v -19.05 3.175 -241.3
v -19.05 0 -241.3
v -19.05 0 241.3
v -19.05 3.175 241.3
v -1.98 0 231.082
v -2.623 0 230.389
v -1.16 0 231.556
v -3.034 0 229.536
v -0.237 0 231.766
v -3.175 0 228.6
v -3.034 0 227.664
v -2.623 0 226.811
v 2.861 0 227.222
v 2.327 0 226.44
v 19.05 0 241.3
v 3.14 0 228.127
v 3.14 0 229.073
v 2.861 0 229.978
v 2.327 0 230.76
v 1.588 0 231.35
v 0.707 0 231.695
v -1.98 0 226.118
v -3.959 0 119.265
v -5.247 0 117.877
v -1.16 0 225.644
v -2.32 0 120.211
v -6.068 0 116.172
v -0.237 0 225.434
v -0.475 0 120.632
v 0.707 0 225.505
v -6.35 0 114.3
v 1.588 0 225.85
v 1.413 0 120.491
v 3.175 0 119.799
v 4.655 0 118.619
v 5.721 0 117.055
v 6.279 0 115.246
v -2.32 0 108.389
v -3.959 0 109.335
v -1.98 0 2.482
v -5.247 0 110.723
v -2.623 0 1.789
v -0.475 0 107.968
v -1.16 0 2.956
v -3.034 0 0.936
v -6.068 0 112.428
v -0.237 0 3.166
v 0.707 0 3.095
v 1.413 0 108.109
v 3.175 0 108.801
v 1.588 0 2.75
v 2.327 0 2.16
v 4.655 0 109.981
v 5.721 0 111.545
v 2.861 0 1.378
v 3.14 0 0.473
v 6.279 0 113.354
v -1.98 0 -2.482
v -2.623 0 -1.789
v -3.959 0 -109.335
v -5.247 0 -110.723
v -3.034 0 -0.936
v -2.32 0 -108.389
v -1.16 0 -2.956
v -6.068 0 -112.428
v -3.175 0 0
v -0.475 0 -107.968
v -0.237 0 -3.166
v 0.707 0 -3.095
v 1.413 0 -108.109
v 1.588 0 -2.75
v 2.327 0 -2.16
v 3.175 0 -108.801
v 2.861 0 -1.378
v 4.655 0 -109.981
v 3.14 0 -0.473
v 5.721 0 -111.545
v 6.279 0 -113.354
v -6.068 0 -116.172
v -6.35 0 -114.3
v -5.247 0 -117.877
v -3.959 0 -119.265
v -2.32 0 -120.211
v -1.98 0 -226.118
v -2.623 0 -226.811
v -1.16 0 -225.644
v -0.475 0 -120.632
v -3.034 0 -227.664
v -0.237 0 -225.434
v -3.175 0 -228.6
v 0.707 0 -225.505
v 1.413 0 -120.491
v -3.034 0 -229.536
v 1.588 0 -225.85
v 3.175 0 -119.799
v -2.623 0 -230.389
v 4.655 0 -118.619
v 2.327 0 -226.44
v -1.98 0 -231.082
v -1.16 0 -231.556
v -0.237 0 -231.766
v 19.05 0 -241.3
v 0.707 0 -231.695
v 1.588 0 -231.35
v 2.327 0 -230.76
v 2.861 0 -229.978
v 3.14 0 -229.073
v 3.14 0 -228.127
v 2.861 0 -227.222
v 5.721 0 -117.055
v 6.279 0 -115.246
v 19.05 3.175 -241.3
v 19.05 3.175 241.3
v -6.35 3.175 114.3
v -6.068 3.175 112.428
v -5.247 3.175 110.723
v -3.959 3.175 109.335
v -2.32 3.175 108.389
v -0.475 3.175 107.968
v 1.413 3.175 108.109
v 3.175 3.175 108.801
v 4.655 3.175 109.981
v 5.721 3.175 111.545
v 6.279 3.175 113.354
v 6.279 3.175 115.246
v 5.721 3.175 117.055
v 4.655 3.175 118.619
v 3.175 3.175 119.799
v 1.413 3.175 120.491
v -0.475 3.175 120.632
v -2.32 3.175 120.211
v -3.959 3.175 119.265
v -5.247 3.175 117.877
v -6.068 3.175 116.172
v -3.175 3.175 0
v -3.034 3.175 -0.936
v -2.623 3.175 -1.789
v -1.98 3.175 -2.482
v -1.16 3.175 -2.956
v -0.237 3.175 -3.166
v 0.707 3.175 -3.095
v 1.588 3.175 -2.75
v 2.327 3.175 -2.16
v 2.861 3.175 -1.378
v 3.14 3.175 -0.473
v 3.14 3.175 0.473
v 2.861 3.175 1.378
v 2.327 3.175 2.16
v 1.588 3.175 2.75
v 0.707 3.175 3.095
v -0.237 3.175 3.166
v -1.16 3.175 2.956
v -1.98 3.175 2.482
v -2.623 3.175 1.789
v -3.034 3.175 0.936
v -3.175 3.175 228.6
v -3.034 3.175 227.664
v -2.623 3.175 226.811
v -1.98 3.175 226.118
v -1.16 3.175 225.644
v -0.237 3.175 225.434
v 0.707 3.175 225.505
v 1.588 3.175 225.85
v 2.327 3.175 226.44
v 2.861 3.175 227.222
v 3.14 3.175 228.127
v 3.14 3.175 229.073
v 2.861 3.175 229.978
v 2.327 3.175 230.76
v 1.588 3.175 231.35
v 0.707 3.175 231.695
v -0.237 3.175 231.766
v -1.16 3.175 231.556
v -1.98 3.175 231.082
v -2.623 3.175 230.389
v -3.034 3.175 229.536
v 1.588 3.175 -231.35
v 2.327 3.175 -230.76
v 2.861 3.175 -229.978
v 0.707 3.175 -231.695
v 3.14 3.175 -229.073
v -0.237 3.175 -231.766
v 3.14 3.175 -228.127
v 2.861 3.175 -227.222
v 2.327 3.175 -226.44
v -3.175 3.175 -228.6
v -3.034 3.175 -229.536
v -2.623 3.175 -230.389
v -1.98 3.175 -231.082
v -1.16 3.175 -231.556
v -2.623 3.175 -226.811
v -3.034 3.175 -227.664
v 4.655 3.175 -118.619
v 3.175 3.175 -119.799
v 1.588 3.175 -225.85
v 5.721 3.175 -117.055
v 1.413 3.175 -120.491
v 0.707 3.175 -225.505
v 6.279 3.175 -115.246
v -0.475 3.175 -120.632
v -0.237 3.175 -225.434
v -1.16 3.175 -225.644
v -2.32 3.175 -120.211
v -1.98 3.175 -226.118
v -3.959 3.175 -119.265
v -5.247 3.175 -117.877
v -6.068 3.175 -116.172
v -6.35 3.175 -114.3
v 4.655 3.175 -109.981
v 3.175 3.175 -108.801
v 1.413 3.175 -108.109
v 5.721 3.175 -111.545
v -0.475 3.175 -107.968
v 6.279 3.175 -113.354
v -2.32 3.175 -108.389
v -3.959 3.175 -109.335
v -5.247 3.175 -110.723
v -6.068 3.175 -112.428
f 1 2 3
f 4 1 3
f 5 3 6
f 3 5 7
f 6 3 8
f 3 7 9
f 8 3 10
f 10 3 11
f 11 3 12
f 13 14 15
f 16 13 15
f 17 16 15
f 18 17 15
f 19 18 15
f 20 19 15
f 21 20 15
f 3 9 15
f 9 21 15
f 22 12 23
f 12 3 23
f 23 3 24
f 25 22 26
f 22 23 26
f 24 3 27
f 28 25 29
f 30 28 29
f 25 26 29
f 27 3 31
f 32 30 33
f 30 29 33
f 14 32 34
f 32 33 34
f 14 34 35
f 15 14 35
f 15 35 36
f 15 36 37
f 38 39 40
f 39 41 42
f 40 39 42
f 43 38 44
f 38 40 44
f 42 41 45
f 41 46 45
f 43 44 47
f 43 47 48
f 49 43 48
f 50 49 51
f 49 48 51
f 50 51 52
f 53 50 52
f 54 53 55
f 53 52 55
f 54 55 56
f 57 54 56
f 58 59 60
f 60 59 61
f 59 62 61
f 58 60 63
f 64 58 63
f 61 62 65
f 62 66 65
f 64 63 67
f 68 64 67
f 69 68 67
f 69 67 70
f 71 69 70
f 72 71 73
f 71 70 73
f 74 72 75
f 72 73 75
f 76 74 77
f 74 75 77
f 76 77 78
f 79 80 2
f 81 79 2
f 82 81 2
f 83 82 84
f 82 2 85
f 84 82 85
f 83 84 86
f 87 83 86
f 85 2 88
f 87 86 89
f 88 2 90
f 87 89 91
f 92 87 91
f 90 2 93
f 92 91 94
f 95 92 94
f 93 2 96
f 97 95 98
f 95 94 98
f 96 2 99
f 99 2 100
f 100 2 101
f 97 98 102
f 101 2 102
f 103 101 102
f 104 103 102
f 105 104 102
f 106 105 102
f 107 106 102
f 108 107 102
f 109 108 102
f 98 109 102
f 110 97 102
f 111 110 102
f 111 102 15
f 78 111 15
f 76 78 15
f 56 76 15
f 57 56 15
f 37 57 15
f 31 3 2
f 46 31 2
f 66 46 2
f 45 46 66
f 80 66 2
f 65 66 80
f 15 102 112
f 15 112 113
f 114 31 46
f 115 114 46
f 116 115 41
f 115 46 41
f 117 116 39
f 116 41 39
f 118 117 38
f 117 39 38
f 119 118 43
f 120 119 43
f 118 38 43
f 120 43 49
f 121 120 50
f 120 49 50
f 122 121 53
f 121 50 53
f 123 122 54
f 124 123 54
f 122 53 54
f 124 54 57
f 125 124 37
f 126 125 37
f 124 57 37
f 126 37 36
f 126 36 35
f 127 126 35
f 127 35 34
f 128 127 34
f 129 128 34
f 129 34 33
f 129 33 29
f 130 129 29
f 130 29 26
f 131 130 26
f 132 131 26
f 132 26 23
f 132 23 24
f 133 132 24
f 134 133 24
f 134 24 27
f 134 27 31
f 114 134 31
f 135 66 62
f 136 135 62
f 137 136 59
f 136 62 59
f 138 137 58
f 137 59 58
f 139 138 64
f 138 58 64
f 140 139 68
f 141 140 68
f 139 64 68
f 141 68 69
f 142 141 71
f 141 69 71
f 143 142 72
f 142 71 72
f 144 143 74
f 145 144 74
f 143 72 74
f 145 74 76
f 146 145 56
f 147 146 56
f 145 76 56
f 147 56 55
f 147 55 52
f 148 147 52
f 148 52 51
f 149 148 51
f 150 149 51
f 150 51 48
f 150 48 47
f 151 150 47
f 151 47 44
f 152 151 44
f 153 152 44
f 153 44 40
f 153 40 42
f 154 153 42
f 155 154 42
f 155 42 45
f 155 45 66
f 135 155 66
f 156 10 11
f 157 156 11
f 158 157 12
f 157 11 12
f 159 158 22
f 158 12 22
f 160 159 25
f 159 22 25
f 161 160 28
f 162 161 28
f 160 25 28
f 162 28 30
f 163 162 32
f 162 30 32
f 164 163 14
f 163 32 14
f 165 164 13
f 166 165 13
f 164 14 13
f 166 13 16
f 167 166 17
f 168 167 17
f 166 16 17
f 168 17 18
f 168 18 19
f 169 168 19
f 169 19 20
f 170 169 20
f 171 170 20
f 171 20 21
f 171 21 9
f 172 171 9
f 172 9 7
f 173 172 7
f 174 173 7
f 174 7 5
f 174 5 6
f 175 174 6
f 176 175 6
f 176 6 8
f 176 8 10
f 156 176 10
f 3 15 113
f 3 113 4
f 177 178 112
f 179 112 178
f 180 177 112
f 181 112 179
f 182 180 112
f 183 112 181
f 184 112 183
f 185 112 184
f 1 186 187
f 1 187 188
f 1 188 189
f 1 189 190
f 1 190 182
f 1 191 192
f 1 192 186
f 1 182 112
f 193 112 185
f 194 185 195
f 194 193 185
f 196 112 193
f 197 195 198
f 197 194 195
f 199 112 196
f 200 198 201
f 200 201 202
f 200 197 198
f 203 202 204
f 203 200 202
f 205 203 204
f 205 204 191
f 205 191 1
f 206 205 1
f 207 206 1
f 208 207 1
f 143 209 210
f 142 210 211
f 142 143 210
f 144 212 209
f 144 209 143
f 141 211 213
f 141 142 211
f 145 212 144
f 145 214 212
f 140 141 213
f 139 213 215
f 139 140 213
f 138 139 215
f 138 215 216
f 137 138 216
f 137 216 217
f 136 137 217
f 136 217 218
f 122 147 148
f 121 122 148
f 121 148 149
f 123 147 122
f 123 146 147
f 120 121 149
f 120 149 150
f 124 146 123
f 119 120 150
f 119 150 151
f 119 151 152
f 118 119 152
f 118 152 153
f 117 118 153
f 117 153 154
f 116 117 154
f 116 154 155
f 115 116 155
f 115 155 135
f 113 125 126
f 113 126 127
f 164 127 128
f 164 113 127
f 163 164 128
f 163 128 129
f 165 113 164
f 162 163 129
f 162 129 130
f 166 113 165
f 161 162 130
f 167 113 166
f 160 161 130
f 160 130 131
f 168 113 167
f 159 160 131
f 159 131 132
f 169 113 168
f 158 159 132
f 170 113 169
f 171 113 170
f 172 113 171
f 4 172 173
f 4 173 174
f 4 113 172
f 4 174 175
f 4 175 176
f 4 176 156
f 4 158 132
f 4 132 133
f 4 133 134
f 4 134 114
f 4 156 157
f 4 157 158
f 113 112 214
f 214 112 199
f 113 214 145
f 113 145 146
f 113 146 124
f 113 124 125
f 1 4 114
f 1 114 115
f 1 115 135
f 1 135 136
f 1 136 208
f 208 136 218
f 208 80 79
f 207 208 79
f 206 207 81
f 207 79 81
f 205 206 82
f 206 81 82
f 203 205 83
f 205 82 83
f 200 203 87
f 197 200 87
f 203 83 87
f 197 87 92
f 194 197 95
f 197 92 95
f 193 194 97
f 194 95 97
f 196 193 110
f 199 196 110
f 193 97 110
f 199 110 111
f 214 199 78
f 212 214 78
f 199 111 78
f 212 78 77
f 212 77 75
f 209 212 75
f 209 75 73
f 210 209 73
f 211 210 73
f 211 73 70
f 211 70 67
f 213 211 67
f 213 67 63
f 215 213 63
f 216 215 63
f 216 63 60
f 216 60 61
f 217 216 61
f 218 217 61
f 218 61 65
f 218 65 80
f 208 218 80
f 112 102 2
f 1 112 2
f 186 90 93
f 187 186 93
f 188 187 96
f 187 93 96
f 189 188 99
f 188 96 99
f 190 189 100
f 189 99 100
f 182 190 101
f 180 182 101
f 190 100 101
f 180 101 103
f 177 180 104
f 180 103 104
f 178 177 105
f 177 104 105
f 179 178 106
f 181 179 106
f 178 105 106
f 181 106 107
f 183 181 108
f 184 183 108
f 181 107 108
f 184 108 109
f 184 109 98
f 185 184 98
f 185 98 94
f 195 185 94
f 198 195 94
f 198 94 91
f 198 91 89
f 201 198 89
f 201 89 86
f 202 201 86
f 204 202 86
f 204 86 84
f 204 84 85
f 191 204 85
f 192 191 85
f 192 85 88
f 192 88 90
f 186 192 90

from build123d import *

# Parameters (mm, degrees)
SKETCH1_W        = 38.1
SKETCH1_H        = 482.6
EXTRUSION1_DEPTH = 3.175
HOLE1_D          = 6.35
HOLE2_D          = 12.7
EXTRUSION2_START = -3.175
SKETCH6_R        = 6.35
EXTRUSION2_DEPTH = 3.175
HOLE3_D          = 12.7
HOLE4_D          = 3.96875
EXTRUSION3_START = -3.175
SKETCH11_R       = 1.984375
EXTRUSION3_DEPTH = 3.175


with BuildPart() as part:
    # Sketch1 → Extrusion1 (new body)
    with BuildSketch(Plane(origin=(0, 0, 0), x_dir=(-1, 0, 0), z_dir=(0, 1, 0))):
        Rectangle(SKETCH1_W, SKETCH1_H)
    extrude(amount=EXTRUSION1_DEPTH)

    # Hole1 (through all)
    with Locations(Plane(origin=(0, 3.175, 0), x_dir=(1, 0, 0), z_dir=(0, 1, 0))):
        with Locations((0, -228.6), (0, 228.6), (0, 0)):
            Hole(HOLE1_D / 2)

    # Hole2 (through all)
    with Locations(Plane(origin=(0, 3.175, 0), x_dir=(1, 0, 0), z_dir=(0, 1, 0))):
        with Locations((0, -101.6), (0, 101.6)):
            Hole(HOLE2_D / 2)

    # Sketch6 → Extrusion2 (add)
    with BuildSketch(Plane(origin=(0, 3.175, 0), x_dir=(1, 0, 0), z_dir=(0, 1, 0)).offset(EXTRUSION2_START)):
        with Locations((0, -101.6)):
            Circle(SKETCH6_R)
        with Locations((0, 101.6)):
            Circle(SKETCH6_R)
    extrude(amount=EXTRUSION2_DEPTH)

    # Hole3 (through all)
    with Locations(Plane(origin=(0, 3.175, 0), x_dir=(1, 0, 0), z_dir=(0, 1, 0))):
        with Locations((0, 114.3), (0, -114.3)):
            Hole(HOLE3_D / 2)

    # Hole4 (through all)
    with Locations(Plane(origin=(0, 3.175, 0), x_dir=(1, 0, 0), z_dir=(0, 1, 0))):
        with Locations((0, -88.9), (0, -139.7), (0, 88.9), (0, 139.7)):
            Hole(HOLE4_D / 2)

    # Sketch11 → Extrusion3 (add)
    with BuildSketch(Plane(origin=(0, 3.175, 0), x_dir=(1, 0, 0), z_dir=(0, 1, 0)).offset(EXTRUSION3_START)):
        with Locations((0, 88.9)):
            Circle(SKETCH11_R)
        with Locations((0, -88.9)):
            Circle(SKETCH11_R)
        with Locations((0, -139.7)):
            Circle(SKETCH11_R)
        with Locations((0, 139.7)):
            Circle(SKETCH11_R)
    extrude(amount=EXTRUSION3_DEPTH)


solid = part.part
